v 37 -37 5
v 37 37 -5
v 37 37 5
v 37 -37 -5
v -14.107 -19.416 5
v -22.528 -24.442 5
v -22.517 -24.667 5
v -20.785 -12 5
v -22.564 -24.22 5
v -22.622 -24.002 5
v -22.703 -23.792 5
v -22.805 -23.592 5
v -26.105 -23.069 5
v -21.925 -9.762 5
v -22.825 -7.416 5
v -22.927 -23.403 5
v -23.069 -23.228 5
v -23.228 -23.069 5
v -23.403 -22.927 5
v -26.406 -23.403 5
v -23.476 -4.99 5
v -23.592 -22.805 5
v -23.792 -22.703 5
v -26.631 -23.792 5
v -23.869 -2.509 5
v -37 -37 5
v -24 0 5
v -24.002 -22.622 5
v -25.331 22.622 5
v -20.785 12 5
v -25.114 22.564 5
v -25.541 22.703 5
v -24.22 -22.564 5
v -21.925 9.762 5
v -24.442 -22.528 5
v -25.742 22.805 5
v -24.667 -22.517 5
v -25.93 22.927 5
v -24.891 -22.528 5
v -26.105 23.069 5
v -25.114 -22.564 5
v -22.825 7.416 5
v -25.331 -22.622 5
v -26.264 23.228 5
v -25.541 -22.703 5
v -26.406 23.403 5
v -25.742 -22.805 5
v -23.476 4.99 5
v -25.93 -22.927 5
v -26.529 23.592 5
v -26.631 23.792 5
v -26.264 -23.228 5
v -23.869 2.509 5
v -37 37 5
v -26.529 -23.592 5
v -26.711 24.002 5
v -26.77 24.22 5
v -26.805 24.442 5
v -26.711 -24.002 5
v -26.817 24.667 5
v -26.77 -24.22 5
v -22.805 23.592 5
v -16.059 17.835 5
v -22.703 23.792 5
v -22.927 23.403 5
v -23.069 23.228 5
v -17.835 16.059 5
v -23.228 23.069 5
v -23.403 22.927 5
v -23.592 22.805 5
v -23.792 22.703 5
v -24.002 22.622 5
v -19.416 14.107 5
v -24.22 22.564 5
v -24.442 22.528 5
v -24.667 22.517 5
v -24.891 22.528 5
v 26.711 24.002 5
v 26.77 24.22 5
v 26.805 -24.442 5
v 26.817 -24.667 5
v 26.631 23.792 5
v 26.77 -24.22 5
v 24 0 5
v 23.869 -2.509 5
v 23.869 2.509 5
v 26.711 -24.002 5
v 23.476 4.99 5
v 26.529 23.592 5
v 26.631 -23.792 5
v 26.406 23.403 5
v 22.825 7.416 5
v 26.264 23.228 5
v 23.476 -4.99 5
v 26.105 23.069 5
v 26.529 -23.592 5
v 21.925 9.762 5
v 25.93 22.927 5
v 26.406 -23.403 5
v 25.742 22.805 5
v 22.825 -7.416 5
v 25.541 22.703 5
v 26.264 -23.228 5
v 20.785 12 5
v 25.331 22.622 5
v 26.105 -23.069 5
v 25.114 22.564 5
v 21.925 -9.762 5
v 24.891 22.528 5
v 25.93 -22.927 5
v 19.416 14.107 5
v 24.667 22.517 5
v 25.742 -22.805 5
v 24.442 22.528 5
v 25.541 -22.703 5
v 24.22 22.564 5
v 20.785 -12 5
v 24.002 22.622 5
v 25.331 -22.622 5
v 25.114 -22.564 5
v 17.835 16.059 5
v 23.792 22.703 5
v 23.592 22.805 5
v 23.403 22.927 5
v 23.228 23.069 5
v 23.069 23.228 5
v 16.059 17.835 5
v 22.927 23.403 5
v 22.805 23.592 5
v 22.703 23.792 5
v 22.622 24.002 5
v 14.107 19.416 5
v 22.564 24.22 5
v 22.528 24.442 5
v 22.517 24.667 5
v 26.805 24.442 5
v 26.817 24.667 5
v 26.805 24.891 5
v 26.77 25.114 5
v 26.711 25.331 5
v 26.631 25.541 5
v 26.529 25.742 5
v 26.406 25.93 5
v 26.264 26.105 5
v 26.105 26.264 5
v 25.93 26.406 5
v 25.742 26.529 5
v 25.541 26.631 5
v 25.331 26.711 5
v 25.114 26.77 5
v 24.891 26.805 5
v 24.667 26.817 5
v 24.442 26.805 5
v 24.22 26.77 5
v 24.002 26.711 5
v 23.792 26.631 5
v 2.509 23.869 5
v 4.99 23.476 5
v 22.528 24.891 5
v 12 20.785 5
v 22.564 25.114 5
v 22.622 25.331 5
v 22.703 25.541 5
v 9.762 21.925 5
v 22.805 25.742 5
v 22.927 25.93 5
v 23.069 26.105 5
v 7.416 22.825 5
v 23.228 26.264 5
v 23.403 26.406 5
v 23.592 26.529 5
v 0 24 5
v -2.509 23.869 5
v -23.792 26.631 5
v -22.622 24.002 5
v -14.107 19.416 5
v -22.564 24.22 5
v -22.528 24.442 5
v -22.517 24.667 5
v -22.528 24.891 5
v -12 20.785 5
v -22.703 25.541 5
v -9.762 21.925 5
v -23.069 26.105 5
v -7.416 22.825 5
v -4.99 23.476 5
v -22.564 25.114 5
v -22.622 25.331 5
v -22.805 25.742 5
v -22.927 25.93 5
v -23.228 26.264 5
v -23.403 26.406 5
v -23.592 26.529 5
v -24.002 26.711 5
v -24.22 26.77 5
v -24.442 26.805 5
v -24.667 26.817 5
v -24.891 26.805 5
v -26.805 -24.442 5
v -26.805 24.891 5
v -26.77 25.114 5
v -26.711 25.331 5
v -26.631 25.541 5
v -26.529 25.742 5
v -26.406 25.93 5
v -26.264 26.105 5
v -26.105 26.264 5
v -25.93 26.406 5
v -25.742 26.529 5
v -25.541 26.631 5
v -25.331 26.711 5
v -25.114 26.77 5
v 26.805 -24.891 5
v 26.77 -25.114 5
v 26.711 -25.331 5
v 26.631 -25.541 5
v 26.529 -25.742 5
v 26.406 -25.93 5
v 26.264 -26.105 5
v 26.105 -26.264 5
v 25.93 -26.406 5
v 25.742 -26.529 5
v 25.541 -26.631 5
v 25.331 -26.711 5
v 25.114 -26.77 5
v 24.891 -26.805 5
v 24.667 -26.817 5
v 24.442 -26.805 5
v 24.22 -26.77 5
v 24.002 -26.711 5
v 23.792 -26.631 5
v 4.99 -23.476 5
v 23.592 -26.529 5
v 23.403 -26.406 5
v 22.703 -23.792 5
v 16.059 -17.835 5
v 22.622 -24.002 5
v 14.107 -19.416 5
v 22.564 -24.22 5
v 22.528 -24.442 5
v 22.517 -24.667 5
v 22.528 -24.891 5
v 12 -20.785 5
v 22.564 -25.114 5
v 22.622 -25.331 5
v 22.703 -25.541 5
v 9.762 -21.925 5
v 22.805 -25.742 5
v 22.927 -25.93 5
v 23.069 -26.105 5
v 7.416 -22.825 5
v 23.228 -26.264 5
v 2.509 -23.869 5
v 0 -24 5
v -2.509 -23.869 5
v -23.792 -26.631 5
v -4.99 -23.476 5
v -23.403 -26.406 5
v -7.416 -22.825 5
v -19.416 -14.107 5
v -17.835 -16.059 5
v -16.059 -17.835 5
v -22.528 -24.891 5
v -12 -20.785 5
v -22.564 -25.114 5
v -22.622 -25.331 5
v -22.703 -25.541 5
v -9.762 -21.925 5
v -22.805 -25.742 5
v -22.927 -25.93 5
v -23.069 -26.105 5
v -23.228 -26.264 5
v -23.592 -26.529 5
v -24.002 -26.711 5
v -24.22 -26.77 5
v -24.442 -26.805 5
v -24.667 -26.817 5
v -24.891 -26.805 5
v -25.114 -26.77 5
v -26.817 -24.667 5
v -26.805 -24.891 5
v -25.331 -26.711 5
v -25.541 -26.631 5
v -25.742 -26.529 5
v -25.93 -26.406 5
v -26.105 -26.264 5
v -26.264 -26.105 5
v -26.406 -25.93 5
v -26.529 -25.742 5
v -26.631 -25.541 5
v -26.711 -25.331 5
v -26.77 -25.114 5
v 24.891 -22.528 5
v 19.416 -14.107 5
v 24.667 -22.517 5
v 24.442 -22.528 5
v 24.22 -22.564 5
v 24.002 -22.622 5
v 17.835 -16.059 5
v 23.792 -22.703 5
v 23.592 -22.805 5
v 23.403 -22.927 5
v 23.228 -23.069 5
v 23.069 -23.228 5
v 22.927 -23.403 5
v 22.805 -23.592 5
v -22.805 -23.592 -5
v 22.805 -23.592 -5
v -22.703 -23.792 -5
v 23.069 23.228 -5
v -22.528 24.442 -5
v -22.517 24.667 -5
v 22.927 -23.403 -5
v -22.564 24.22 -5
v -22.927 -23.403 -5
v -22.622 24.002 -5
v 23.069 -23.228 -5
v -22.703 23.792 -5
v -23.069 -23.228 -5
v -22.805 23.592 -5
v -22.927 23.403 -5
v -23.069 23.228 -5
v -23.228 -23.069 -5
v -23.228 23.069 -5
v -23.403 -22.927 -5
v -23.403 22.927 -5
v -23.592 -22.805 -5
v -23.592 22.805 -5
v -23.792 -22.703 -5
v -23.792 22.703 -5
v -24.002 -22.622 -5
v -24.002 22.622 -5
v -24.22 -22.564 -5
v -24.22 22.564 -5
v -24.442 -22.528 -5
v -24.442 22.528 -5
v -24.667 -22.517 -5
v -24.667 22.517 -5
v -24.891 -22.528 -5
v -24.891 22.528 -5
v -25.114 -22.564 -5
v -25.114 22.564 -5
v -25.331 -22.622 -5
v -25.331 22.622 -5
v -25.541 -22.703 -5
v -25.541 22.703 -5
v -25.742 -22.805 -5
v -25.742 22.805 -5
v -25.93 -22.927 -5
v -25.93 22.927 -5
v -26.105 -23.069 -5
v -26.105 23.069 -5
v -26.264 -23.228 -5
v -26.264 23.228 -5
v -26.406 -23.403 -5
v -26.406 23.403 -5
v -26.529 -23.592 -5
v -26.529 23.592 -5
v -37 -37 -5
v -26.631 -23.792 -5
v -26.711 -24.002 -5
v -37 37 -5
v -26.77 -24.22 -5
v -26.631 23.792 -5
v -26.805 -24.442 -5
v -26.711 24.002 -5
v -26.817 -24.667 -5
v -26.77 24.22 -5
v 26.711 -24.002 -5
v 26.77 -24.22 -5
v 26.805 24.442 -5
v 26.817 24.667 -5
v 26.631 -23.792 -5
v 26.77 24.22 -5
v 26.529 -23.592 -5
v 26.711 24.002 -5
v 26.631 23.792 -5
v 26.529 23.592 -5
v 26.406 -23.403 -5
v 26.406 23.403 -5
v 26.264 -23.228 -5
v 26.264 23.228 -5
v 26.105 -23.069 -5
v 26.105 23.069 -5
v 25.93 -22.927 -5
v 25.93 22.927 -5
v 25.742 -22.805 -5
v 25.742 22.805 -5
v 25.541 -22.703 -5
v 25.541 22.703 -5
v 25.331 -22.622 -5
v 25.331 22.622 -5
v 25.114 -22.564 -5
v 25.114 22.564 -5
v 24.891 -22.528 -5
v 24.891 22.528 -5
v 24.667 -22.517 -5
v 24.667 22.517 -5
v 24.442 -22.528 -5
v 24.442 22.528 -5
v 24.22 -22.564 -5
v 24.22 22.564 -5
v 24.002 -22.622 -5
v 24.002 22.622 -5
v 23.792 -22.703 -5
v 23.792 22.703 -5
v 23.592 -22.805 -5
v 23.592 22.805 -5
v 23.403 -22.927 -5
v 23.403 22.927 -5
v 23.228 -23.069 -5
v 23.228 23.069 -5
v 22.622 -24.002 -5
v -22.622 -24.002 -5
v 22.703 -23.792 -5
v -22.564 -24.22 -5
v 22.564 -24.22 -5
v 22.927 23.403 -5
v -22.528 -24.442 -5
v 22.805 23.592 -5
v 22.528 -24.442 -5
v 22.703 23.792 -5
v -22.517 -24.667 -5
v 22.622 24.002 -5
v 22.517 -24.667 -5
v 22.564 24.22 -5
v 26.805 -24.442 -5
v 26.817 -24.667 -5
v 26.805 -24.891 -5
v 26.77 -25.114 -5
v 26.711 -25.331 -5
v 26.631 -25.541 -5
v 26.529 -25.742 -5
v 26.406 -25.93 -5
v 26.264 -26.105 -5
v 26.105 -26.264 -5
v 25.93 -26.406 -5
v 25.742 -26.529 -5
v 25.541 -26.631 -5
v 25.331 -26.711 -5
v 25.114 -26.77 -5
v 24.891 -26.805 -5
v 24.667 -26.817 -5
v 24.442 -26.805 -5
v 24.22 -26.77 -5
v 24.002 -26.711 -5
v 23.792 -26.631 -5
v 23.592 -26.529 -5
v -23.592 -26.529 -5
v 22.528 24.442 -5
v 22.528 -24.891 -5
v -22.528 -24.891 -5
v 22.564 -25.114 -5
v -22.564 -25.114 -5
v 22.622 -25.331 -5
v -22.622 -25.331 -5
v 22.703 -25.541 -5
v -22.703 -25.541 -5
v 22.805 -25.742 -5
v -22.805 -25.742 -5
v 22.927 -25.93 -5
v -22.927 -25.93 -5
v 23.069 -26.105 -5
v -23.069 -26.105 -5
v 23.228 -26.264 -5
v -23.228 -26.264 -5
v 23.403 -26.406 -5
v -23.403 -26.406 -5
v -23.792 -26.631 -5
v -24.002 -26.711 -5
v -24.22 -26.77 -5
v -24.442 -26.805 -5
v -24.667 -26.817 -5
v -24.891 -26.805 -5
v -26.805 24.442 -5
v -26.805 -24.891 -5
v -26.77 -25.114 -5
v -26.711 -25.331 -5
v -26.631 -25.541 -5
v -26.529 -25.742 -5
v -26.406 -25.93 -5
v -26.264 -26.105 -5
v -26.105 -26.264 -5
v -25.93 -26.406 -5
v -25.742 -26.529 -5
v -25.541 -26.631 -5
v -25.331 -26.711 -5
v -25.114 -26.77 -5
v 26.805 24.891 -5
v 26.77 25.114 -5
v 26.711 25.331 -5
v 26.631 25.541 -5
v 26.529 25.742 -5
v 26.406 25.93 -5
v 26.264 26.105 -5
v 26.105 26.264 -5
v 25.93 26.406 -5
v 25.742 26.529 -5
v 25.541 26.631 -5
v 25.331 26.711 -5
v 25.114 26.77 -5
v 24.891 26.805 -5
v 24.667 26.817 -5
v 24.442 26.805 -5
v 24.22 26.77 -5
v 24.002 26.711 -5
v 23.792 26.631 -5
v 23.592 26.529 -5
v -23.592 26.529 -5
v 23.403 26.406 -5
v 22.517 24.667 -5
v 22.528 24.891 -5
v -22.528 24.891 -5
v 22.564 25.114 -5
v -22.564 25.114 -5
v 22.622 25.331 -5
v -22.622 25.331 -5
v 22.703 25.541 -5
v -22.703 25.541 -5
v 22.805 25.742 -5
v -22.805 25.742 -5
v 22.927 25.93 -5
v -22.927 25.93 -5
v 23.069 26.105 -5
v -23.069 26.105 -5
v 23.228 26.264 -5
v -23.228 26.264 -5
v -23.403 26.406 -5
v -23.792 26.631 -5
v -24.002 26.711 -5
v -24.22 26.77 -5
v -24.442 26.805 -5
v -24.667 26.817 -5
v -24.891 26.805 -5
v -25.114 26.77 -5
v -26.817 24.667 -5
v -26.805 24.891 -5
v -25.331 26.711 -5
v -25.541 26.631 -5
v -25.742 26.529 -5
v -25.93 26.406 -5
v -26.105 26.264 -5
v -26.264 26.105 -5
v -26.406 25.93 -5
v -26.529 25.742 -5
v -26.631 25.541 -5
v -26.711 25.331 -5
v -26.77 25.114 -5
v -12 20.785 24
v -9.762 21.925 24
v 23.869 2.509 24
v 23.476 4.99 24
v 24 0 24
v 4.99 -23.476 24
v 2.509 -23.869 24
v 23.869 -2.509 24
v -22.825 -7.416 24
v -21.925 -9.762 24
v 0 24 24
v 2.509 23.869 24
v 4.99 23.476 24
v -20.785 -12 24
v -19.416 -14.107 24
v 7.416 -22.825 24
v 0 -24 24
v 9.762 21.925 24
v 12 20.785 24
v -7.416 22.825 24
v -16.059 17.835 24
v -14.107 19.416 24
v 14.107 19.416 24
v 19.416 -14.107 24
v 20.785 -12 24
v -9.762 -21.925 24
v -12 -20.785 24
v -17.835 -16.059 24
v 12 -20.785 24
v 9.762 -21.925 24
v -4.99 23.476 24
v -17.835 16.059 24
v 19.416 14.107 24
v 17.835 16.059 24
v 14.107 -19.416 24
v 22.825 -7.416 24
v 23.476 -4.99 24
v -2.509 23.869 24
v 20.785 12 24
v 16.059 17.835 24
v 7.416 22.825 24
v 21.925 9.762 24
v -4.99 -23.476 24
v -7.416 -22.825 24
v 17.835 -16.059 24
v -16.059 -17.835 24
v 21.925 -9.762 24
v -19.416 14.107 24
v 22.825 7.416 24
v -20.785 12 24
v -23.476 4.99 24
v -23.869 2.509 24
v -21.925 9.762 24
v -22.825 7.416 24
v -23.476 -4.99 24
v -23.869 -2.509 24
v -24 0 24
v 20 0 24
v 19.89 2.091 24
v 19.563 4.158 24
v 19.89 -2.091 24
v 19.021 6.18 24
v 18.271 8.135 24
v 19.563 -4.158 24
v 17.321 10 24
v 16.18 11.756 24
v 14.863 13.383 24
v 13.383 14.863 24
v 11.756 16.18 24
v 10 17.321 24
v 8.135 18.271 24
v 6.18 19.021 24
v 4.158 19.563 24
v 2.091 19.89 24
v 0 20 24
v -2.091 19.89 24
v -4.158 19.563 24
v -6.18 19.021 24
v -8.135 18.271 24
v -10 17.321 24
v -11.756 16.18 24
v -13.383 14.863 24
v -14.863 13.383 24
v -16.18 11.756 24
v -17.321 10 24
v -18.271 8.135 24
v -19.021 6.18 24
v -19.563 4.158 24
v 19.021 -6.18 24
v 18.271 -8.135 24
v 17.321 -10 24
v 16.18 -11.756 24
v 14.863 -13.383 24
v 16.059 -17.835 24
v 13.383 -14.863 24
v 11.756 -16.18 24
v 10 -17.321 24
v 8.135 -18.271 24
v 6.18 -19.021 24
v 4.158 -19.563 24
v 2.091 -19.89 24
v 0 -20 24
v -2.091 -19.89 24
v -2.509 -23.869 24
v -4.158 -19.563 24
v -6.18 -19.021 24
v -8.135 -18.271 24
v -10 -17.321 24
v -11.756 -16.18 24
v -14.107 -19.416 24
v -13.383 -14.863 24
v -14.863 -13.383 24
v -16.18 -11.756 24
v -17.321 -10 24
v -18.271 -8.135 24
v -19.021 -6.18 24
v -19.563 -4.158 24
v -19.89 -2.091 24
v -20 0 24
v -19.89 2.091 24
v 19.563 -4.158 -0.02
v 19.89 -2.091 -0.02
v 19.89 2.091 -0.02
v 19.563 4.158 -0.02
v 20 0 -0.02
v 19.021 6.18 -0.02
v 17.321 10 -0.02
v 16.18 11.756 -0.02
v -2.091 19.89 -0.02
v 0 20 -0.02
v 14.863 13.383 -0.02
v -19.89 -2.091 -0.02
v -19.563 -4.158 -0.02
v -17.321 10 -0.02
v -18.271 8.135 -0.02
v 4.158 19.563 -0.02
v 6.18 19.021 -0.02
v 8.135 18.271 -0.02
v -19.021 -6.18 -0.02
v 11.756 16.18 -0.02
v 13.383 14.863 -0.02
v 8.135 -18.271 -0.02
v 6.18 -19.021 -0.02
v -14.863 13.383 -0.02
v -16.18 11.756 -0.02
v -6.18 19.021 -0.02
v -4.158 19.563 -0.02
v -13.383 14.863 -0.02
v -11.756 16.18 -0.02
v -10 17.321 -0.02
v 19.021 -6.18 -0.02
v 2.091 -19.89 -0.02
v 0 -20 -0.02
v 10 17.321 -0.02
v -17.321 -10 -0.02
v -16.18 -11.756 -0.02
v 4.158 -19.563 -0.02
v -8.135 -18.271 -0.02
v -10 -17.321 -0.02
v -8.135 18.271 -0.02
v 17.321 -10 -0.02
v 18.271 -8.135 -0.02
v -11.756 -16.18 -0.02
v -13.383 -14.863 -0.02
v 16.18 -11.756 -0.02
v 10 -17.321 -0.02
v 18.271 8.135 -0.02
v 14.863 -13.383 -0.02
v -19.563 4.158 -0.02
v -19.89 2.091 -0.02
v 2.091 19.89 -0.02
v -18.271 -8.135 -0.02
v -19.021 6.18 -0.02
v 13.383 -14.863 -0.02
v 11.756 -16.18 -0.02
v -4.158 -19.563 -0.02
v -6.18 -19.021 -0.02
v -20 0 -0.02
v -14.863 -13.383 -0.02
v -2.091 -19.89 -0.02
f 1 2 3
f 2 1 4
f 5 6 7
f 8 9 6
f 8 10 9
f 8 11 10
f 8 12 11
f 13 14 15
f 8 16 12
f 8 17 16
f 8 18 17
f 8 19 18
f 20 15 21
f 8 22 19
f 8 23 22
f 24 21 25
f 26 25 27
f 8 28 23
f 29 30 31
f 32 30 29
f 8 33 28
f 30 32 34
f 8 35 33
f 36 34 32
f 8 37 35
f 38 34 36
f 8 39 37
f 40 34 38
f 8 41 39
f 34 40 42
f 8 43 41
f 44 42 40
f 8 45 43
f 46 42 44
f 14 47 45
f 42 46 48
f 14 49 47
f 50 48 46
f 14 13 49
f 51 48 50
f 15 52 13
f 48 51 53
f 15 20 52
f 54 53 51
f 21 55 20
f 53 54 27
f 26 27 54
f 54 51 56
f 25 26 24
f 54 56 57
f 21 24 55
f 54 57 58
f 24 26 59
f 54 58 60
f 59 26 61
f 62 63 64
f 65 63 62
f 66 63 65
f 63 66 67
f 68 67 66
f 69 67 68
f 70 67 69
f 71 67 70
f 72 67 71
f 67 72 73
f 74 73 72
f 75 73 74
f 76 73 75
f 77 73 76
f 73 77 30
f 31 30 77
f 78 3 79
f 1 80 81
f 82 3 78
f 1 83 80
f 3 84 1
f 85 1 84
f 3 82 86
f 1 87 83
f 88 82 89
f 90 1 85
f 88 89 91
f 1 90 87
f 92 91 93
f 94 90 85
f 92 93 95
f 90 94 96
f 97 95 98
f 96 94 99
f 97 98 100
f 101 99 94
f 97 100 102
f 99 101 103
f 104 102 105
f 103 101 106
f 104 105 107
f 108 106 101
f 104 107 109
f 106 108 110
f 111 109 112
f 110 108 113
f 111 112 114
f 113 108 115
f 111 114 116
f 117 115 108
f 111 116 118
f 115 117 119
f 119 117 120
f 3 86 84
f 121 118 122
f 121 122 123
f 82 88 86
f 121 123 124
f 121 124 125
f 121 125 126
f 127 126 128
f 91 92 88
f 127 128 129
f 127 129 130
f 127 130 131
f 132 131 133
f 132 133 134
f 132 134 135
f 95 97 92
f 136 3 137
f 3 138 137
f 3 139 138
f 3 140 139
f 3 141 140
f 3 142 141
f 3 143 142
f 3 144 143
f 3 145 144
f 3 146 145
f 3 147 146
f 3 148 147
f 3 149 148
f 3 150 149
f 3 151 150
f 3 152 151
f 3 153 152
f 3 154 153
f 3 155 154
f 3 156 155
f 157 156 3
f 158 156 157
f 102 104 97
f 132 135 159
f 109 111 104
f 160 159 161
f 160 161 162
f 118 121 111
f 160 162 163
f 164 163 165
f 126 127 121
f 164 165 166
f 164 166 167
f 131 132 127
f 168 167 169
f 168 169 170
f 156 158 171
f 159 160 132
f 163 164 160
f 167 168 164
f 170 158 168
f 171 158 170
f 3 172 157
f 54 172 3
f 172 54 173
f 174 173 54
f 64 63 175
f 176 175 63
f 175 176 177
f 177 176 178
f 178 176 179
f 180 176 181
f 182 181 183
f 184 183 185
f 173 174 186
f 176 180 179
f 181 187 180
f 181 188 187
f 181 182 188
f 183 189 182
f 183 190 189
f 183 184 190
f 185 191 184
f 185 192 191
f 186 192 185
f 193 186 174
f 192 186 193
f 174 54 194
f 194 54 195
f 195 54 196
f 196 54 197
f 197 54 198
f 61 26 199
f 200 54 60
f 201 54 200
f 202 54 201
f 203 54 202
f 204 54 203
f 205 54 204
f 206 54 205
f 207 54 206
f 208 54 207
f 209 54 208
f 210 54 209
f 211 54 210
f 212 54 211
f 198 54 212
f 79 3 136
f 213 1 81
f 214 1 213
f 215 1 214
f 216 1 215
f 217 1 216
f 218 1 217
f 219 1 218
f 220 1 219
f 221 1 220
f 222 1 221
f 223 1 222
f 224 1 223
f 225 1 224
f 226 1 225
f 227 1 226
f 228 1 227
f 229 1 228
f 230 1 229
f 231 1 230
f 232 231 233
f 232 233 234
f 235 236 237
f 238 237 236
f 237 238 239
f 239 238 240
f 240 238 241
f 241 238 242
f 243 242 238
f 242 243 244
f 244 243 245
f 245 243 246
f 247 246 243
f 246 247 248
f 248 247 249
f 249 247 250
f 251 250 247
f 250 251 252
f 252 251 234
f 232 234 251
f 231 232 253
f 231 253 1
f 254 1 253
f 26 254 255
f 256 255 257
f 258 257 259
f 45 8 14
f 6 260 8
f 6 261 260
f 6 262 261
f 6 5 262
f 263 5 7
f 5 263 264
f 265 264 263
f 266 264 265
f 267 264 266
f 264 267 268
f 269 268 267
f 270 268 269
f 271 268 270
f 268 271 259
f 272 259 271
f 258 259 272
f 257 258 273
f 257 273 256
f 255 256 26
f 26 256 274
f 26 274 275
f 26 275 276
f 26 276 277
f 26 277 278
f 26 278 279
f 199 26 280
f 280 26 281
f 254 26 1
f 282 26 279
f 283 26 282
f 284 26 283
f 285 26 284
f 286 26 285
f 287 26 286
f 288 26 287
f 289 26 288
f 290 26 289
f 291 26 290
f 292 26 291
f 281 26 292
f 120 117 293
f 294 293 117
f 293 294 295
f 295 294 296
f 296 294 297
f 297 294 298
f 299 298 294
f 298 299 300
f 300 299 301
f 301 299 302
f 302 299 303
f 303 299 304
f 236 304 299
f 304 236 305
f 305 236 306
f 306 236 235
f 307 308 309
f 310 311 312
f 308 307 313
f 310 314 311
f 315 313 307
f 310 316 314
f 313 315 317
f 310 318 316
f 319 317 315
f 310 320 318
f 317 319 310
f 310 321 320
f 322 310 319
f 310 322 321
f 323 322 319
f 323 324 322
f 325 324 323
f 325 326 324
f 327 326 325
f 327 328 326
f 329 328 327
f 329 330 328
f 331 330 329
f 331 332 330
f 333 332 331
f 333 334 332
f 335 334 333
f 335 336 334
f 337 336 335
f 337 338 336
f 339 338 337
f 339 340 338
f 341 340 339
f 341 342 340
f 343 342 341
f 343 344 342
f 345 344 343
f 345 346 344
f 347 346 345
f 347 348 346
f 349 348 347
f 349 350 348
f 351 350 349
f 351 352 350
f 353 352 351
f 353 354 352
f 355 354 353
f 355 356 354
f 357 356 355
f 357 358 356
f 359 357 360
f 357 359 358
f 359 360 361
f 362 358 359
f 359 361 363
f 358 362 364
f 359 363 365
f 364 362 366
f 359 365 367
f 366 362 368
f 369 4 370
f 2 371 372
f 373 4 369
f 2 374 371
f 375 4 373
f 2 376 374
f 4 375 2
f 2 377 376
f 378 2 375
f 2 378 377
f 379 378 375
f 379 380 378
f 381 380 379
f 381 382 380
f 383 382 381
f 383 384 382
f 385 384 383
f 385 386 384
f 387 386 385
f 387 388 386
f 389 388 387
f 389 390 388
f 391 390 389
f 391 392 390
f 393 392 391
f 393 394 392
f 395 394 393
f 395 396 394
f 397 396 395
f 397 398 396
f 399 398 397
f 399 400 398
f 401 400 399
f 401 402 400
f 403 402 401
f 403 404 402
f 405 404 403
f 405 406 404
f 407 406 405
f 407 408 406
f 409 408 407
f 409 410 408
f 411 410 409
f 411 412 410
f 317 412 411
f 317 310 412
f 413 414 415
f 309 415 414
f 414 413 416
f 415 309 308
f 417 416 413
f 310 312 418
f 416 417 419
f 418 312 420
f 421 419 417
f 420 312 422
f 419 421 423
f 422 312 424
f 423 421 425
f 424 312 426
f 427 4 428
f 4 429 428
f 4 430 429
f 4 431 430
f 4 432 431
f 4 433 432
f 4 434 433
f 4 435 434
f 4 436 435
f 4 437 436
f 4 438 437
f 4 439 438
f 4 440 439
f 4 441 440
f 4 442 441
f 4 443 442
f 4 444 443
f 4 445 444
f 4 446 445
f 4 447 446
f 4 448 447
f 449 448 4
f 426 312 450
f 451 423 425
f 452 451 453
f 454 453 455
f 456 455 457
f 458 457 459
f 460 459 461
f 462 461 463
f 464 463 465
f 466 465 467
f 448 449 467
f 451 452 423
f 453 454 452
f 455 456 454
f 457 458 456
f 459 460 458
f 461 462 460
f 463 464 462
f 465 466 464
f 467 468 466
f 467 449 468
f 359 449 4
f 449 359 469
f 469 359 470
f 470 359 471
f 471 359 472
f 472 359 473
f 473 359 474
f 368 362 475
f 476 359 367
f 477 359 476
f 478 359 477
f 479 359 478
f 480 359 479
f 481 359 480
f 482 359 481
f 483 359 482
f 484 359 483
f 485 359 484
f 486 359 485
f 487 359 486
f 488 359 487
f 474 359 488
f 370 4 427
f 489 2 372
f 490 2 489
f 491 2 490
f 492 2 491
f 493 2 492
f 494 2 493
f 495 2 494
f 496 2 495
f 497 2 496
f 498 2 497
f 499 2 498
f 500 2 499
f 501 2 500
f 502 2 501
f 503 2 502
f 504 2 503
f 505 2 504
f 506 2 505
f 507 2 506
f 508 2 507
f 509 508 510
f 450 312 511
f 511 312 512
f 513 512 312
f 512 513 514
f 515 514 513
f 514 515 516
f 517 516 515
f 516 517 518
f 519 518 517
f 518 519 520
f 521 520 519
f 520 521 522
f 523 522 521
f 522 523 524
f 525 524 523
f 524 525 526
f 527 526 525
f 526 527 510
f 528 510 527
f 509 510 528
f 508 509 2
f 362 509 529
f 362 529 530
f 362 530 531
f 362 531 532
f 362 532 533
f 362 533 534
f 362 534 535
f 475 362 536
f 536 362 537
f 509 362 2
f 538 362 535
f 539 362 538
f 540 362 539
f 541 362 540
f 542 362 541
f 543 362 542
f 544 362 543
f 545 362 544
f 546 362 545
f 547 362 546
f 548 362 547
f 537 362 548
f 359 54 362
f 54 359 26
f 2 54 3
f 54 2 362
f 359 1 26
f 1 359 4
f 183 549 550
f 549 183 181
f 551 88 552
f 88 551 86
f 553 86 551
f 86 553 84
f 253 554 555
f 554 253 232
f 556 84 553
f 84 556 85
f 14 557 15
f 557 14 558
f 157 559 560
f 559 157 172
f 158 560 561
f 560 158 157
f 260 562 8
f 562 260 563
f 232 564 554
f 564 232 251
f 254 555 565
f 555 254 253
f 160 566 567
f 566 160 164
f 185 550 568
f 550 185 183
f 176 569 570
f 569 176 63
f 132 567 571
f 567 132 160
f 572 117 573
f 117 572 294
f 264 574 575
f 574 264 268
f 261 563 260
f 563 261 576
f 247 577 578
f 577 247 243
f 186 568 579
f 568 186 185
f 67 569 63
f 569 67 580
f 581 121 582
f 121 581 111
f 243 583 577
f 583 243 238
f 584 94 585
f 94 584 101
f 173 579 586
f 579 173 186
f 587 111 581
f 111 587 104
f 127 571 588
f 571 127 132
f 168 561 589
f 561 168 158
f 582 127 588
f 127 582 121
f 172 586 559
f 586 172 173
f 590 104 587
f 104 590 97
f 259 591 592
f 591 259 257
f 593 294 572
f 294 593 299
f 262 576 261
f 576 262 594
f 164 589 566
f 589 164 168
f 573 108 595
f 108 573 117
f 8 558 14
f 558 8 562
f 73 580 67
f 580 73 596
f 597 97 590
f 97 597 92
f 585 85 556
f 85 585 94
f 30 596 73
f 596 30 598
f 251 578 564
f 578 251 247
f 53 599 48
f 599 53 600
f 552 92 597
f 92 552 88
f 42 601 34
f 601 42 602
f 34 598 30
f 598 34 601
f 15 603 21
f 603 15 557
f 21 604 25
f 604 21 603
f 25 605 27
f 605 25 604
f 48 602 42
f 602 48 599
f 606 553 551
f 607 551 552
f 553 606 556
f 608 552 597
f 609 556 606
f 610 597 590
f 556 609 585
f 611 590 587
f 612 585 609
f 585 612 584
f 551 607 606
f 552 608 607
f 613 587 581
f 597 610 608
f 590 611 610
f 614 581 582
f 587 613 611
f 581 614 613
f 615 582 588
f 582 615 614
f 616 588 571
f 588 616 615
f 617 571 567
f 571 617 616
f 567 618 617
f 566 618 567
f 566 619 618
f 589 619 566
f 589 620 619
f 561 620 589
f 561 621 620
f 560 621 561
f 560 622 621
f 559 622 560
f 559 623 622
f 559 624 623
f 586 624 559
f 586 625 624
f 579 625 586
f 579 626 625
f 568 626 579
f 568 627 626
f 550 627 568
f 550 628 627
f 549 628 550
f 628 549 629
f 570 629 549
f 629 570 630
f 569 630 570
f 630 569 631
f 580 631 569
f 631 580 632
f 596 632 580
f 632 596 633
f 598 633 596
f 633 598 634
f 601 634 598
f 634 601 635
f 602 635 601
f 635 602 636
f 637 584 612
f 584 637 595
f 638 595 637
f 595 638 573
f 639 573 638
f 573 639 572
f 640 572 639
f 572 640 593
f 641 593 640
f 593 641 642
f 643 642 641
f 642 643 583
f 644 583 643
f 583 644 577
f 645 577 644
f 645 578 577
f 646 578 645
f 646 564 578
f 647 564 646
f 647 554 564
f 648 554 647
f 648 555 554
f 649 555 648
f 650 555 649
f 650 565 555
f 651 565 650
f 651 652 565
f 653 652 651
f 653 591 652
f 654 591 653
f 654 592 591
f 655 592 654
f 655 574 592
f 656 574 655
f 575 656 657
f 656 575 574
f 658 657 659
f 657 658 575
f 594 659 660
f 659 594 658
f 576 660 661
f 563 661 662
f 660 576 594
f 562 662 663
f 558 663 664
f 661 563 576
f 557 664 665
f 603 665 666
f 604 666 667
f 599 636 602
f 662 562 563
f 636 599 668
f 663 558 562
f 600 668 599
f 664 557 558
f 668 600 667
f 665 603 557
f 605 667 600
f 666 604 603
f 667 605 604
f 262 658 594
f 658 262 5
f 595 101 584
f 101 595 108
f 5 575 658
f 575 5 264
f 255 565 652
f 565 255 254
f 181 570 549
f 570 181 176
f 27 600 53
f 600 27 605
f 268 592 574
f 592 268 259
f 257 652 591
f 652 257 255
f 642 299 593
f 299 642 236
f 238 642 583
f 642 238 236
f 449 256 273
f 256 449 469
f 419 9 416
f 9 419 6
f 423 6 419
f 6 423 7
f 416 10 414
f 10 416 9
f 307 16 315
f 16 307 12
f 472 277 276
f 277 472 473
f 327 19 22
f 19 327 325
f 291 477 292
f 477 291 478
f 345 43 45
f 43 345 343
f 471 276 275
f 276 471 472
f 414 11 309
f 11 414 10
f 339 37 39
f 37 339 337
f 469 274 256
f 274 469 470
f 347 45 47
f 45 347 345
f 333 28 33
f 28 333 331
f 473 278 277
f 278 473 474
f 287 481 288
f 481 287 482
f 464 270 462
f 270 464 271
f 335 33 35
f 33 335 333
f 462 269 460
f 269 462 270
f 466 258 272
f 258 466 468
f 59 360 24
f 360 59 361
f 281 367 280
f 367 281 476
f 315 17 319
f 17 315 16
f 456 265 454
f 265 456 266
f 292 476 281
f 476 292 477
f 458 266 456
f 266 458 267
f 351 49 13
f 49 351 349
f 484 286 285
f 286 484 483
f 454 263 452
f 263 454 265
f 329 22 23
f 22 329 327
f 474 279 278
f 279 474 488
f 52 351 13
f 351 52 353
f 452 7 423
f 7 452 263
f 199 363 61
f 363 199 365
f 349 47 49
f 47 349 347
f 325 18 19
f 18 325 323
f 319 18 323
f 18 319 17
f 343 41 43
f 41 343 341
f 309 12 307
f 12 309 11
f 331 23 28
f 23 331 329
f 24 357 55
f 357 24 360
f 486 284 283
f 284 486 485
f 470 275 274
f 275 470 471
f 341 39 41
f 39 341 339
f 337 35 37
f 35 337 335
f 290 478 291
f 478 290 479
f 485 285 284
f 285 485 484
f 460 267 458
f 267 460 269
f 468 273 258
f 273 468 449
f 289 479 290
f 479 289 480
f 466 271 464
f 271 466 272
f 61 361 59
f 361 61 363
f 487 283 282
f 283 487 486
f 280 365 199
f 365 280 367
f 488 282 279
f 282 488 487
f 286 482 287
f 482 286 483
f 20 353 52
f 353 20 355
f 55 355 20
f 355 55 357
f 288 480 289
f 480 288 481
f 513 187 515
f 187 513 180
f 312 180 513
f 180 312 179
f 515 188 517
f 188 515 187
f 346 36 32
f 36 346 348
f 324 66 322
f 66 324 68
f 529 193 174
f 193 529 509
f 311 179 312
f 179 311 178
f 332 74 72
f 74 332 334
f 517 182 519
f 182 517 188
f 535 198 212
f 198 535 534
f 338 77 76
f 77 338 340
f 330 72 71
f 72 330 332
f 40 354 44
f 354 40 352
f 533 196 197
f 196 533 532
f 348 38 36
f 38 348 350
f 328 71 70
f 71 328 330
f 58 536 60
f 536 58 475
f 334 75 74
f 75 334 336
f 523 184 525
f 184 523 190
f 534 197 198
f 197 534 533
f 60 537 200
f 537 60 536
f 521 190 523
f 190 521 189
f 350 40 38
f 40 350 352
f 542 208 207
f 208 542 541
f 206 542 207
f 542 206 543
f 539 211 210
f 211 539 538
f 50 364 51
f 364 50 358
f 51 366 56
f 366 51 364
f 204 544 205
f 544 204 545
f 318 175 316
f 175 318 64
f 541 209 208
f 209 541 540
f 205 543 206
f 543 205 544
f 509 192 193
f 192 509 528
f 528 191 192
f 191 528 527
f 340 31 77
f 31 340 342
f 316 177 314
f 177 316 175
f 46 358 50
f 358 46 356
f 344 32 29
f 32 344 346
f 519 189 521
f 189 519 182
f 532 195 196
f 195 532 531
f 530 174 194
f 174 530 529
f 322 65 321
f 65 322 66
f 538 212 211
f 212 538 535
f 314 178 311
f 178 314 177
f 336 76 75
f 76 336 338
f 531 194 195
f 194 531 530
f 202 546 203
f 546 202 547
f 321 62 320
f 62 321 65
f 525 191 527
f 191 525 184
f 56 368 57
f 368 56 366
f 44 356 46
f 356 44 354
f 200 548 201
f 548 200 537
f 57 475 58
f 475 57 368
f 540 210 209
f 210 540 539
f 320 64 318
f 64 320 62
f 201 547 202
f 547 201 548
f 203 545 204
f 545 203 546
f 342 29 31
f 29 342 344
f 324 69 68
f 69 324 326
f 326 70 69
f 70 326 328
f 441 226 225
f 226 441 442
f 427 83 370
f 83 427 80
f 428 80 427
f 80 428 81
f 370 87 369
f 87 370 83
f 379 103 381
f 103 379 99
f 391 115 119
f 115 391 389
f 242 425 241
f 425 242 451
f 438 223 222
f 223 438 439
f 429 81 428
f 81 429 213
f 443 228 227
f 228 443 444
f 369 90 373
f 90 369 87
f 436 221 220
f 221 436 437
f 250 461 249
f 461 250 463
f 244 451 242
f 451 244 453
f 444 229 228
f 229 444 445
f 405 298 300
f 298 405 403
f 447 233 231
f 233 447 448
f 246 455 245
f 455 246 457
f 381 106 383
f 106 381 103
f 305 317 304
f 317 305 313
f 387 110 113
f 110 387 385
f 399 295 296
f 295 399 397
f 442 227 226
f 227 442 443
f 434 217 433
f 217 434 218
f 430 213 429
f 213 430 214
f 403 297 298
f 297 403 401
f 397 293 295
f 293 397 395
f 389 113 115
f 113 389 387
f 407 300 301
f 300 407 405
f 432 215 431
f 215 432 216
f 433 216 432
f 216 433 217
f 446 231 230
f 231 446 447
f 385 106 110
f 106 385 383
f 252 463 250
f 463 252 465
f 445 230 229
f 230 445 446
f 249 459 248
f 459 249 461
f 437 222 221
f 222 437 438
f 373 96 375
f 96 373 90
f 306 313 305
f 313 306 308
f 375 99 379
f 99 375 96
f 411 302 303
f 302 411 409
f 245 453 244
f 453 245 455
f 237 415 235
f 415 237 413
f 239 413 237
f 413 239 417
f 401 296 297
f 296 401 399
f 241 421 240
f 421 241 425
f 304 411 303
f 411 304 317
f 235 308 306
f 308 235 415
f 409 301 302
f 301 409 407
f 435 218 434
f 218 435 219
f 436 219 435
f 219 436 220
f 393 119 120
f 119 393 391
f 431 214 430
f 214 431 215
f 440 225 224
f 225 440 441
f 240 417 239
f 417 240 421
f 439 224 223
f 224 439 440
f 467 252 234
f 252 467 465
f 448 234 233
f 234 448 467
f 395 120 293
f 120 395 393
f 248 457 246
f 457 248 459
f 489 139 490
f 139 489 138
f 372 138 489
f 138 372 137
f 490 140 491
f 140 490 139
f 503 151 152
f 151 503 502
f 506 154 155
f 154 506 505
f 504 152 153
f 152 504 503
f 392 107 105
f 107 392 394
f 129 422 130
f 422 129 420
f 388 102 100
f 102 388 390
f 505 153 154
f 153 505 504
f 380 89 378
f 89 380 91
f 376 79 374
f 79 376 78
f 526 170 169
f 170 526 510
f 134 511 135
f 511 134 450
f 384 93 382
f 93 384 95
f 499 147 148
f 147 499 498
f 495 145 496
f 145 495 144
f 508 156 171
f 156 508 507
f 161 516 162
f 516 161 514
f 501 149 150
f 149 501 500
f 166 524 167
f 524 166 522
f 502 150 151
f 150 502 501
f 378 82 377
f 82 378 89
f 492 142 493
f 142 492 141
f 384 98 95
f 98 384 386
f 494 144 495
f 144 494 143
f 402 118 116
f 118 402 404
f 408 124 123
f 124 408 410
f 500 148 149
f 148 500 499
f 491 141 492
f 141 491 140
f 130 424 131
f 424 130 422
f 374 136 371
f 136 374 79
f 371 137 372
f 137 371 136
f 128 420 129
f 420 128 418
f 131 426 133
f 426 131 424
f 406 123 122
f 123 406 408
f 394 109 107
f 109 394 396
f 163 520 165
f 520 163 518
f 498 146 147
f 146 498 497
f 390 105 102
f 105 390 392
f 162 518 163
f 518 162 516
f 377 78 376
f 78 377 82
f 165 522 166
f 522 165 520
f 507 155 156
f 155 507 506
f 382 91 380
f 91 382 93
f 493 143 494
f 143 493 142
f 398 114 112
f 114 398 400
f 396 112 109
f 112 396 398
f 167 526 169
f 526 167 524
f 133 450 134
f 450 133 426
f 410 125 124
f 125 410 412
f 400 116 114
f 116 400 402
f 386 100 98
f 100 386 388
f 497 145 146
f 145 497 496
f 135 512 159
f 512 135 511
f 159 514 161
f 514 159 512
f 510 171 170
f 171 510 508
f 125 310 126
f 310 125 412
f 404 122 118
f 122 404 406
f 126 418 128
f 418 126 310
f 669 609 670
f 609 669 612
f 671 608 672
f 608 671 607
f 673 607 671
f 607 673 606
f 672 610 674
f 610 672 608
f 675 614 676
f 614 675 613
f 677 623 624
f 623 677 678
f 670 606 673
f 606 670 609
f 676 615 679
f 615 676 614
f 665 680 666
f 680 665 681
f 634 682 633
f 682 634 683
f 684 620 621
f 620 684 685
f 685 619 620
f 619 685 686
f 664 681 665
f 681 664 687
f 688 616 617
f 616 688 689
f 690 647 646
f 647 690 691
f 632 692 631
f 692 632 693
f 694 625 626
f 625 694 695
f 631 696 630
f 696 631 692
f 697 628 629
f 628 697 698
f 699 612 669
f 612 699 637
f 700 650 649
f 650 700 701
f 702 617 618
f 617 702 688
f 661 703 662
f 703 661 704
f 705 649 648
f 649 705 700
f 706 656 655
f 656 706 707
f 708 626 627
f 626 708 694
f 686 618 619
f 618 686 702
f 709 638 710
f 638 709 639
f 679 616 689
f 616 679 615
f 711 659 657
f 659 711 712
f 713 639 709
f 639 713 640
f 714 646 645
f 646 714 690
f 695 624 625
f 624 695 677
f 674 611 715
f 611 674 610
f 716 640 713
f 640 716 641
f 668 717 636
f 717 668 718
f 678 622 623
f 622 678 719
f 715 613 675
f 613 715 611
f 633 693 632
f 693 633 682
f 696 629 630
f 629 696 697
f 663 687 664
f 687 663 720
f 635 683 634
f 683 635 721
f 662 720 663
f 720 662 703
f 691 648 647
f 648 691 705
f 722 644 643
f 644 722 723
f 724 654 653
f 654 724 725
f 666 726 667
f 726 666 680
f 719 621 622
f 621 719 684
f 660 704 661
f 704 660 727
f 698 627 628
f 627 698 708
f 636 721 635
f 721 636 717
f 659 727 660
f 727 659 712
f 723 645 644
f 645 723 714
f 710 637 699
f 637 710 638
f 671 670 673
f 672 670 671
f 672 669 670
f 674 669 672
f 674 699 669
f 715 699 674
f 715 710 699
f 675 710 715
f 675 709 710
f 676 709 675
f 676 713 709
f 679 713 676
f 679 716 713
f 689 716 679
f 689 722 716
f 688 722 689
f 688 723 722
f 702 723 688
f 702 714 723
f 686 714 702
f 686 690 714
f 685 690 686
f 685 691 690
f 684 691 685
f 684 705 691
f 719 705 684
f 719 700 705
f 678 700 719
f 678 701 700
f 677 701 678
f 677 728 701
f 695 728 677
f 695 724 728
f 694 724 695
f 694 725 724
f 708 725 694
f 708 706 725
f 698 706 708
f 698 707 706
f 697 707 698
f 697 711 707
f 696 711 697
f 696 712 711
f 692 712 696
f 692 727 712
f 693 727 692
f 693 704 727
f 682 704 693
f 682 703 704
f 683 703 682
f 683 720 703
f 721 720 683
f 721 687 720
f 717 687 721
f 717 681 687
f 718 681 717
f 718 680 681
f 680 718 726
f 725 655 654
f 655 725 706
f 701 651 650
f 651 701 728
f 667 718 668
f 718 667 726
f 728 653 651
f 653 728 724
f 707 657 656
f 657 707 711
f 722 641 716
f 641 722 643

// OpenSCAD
// Flange bearing block for 40 mm bearing OD.
$fn = 60;
eps = 0.02;
bearing_d = 40;
plate_l = bearing_d + 34;
plate_t = 10;
hub_h = bearing_d / 2 + 4;
difference() {
    union() {
        cube([plate_l, plate_l, plate_t], center = true);
        cylinder(d = bearing_d + 8, h = hub_h);
    }
    translate([0, 0, -eps]) cylinder(d = bearing_d, h = hub_h + 2 * eps);
    for (x = [-plate_l / 3, plate_l / 3], y = [-plate_l / 3, plate_l / 3])
        translate([x, y, -plate_t / 2 - eps]) cylinder(d = 4.3, h = plate_t + 2 * eps);
}
